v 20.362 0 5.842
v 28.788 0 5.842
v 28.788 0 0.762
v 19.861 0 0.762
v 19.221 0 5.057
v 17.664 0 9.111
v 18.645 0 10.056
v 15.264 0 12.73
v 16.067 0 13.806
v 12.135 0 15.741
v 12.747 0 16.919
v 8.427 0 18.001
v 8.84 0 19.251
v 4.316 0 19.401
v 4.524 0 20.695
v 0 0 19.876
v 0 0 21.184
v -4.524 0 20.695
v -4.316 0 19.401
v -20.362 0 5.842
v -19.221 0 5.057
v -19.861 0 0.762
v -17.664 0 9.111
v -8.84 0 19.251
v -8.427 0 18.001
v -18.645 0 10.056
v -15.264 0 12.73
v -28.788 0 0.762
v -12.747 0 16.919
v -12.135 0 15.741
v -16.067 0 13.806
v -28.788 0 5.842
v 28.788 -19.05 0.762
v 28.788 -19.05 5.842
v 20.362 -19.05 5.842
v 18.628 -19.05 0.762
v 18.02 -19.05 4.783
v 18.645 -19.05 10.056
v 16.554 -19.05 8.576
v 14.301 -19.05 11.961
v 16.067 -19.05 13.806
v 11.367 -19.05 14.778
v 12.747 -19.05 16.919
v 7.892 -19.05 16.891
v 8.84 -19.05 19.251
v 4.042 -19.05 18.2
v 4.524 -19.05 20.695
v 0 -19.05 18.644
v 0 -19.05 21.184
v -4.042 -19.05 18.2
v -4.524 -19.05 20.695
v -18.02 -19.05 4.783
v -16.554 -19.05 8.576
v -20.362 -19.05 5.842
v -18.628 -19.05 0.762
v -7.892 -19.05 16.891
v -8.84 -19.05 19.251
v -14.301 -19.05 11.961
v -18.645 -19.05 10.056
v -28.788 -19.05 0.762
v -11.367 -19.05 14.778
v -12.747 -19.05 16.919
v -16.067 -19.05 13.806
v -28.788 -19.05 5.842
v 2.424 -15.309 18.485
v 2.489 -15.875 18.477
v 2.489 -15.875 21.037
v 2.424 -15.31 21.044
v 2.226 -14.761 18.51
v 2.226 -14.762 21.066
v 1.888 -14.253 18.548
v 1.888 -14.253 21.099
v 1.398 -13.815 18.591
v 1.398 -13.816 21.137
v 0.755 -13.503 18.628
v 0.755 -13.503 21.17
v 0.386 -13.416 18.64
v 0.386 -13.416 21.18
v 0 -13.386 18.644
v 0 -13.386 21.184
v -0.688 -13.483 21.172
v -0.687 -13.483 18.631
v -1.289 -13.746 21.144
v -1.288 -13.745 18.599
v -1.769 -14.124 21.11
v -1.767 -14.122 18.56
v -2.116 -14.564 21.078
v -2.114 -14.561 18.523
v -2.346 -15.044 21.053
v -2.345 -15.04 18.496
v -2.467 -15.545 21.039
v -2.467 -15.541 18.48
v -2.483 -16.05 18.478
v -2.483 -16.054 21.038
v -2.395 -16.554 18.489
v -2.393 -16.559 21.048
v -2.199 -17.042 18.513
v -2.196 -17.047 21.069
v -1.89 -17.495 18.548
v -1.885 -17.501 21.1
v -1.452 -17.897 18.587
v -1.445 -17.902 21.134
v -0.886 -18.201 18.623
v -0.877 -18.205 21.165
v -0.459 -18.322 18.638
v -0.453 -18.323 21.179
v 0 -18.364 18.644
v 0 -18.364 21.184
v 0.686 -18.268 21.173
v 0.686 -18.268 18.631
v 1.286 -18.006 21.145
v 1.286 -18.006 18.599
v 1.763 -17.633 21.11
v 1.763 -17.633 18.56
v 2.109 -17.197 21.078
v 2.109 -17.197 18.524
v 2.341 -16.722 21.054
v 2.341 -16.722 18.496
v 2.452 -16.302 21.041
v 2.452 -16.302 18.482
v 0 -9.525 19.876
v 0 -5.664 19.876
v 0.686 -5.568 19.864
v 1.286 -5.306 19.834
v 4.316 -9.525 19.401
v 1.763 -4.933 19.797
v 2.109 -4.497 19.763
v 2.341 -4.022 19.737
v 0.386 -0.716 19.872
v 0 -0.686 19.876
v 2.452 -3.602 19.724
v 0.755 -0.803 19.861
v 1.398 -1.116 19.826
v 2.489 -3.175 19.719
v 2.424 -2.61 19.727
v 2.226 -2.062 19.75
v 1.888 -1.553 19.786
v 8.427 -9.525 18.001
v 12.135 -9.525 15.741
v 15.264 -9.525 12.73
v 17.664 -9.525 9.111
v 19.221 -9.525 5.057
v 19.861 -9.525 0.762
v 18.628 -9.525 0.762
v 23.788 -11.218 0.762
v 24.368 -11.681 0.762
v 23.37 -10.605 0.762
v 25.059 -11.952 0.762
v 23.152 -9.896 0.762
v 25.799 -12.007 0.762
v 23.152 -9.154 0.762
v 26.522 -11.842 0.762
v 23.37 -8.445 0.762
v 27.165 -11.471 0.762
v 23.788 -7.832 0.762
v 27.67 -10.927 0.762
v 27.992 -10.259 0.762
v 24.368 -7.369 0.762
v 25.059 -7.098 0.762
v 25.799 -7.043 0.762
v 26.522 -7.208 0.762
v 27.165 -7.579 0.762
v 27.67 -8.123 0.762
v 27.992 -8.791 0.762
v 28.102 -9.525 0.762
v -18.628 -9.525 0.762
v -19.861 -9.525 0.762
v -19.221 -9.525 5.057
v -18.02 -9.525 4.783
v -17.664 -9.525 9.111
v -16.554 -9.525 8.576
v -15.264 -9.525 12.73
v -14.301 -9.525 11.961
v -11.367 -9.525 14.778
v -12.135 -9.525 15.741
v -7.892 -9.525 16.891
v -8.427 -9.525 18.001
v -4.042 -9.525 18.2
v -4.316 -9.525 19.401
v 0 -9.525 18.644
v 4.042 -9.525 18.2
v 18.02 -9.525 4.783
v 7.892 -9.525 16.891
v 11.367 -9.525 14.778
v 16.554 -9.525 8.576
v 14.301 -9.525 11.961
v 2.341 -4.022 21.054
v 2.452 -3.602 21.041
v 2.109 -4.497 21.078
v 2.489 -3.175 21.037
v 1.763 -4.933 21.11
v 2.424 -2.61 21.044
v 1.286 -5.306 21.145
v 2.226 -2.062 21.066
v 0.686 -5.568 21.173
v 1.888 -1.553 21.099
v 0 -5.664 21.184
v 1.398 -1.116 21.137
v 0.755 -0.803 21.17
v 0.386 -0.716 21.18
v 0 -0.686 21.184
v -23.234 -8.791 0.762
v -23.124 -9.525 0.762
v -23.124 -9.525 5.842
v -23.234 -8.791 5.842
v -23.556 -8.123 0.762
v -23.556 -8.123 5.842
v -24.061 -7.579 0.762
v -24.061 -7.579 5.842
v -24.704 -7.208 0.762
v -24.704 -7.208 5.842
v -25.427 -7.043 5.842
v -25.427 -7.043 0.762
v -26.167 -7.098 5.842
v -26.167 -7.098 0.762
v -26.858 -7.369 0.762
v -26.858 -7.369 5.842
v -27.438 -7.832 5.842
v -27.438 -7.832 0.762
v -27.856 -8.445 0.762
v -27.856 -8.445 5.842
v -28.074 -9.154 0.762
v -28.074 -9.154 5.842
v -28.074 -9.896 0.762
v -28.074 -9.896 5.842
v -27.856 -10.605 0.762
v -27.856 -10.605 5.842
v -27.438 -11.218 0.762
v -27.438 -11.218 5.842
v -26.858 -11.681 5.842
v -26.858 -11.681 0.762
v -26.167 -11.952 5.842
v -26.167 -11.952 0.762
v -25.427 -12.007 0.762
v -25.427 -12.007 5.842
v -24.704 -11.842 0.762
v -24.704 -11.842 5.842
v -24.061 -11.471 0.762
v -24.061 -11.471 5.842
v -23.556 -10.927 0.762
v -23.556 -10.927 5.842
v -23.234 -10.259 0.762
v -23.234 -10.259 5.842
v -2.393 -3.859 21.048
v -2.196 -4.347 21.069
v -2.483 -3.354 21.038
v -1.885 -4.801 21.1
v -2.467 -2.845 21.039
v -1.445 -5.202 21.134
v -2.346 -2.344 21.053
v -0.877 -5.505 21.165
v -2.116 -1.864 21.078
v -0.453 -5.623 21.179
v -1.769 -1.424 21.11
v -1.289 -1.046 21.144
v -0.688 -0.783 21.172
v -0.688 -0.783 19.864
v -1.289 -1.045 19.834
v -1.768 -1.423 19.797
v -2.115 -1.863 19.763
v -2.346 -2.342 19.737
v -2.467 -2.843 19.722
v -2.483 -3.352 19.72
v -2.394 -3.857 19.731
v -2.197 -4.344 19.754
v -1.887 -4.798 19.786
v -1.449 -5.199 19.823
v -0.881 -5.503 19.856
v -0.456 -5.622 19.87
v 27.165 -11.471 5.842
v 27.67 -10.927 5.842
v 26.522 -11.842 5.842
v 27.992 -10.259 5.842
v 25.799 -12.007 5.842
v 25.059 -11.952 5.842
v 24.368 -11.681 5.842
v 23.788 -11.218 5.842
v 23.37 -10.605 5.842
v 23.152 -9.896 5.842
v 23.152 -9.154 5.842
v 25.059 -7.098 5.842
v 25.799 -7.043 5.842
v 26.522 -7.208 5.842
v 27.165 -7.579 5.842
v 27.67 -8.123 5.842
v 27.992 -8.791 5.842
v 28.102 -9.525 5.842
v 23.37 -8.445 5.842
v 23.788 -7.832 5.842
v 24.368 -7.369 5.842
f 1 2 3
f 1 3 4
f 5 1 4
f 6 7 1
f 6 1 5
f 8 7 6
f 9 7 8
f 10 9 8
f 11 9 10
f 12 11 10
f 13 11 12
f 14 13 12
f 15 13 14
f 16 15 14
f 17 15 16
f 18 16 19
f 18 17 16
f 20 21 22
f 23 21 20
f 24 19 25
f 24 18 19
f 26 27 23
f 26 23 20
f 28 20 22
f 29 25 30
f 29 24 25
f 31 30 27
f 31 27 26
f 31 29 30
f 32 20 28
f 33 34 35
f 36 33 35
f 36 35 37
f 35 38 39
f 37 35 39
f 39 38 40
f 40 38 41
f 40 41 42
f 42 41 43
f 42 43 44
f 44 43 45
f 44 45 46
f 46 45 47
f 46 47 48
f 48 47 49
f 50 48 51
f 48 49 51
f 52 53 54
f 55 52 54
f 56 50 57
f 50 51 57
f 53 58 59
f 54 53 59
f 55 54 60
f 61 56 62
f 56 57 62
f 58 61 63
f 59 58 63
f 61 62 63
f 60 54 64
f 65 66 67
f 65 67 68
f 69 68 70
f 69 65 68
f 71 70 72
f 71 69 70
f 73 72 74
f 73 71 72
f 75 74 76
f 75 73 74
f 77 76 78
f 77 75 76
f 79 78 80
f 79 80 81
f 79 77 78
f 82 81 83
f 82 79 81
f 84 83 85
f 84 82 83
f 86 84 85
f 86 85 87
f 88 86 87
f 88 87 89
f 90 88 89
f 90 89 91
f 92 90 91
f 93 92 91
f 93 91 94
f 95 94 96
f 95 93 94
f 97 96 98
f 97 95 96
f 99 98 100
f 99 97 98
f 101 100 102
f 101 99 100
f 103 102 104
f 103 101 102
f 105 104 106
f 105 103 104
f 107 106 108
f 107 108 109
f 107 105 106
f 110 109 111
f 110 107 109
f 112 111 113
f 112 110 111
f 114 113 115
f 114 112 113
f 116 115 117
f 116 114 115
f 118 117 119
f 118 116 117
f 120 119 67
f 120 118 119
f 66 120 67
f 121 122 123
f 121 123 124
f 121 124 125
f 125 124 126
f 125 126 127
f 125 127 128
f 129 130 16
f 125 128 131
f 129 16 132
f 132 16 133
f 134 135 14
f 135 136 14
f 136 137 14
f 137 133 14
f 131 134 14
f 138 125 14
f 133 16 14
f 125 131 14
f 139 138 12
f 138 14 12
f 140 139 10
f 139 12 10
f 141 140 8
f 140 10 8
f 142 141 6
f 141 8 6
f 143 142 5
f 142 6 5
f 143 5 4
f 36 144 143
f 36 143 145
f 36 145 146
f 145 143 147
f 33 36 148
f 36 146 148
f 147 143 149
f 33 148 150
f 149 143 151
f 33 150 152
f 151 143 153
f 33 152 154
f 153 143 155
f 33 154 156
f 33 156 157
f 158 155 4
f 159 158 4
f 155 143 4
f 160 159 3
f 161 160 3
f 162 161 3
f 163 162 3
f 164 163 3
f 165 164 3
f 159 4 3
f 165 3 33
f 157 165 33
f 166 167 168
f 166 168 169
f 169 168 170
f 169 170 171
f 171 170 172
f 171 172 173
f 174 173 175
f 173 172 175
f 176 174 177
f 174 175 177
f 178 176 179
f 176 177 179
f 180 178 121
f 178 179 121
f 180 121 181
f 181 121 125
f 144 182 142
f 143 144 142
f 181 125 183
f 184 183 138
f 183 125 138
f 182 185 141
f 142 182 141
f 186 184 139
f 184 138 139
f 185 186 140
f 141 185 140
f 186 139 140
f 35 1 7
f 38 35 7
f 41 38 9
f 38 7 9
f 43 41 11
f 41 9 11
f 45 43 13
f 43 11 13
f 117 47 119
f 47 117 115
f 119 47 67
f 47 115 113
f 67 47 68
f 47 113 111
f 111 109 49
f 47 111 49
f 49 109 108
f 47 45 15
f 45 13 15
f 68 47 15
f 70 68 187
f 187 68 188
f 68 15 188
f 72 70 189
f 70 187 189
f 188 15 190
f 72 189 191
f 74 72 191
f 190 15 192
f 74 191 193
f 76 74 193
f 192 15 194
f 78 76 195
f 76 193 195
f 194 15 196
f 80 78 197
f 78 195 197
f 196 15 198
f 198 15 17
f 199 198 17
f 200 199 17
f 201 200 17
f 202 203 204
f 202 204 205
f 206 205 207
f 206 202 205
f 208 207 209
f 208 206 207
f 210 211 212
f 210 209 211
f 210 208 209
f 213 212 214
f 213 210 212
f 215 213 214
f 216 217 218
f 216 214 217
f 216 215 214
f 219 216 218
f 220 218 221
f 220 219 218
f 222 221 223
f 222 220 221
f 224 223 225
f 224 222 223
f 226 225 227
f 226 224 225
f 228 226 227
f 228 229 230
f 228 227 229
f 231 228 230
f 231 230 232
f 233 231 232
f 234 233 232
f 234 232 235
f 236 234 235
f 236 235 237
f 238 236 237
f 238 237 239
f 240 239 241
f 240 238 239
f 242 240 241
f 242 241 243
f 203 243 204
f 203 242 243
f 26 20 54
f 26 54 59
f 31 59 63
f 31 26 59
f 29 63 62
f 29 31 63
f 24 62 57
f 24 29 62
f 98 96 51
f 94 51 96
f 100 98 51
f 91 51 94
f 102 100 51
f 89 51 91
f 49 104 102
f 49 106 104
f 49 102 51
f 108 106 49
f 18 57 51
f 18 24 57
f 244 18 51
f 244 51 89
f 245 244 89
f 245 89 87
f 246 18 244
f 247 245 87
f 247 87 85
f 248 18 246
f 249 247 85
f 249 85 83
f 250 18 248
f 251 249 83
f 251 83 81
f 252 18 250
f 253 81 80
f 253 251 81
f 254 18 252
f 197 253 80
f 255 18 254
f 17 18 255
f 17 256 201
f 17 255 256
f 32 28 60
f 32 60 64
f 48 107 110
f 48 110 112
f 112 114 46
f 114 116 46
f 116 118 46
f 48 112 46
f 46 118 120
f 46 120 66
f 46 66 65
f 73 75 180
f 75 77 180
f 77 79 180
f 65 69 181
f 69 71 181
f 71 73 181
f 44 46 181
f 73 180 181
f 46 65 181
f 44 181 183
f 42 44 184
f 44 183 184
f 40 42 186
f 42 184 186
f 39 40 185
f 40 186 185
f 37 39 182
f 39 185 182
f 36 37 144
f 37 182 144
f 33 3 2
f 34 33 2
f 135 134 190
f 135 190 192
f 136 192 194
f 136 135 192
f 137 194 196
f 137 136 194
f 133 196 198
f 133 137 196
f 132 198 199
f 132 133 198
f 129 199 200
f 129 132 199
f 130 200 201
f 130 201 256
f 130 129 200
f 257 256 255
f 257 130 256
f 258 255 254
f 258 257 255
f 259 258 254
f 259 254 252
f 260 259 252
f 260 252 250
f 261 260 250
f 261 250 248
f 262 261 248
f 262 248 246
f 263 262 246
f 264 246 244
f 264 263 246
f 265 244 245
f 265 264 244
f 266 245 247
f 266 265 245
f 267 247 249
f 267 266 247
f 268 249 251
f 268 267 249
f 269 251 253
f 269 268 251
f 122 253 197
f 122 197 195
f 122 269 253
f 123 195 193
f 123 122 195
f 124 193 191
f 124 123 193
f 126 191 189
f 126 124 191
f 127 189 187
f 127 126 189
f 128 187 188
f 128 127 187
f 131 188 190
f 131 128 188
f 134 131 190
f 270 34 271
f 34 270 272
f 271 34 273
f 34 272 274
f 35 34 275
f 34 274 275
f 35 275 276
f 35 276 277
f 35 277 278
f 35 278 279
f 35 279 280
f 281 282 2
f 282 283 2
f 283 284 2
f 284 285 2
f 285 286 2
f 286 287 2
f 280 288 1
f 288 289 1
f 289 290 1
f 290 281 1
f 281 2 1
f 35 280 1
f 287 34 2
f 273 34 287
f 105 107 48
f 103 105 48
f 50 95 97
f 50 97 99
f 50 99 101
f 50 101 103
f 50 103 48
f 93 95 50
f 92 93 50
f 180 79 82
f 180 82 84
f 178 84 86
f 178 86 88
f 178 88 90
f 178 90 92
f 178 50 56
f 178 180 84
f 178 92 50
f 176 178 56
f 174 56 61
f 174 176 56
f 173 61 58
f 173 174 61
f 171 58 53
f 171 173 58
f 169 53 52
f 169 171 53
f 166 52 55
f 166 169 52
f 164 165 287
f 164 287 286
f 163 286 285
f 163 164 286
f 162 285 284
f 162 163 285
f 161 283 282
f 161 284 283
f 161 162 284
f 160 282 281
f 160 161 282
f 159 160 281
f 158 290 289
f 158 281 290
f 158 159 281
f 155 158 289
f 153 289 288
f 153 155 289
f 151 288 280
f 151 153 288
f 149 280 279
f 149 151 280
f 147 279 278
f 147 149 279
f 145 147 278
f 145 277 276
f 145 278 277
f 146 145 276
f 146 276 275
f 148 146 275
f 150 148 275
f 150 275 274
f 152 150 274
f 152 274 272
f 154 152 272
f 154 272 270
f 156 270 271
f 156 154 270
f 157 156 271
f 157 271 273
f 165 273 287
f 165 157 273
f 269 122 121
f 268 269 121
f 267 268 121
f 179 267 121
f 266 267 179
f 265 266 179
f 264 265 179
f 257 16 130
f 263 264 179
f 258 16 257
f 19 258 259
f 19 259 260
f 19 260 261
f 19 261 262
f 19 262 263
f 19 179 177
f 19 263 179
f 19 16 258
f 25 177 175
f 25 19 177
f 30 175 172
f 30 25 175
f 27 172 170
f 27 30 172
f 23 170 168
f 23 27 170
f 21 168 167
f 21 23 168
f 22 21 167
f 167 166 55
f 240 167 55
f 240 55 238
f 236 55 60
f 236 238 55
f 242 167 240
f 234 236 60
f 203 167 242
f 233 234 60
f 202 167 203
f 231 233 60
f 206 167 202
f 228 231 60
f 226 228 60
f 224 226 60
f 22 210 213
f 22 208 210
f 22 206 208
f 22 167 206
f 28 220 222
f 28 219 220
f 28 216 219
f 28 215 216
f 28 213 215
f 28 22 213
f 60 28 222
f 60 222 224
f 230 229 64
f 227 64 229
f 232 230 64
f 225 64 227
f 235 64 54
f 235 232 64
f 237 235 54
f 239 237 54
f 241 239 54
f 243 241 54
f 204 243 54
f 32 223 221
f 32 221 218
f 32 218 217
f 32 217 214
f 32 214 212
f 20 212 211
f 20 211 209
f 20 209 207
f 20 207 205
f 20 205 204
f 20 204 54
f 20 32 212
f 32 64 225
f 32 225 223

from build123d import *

# Parameters (mm, degrees)
F1_DEPTH = 19.05
F3_DEPTH = 9.525
F5_R     = 2.4892
F6_DEPTH = 25.4


# Not quite as in the source:
# - a length typed as a fraction of an inch, garbled in the dataset ("3 / 203.2 mm" for 3/8 in), is restored


with BuildPart() as f1:
    # F0 (on Front) → F1 (new body)
    with BuildSketch(Plane.XZ):
        with BuildLine():
            ThreePointArc((0, 18.6436), (12.9107977631, 13.4497257251), (18.6280212841, 0.762))
            Line((18.6280212841, 0.762), (28.7880212841, 0.762))
            Line((28.7880212841, 0.762), (28.7880212841, 5.842))
            Line((28.7880212841, 5.842), (20.3621203454, 5.842))
            ThreePointArc((20.3621203454, 5.842), (12.7473588982, 16.9189169299), (0, 21.1836))
            Line((0, 21.1836), (0, 18.6436))
        make_face()
    extrude(amount=F1_DEPTH)

    # F2 (on face) → F3 (cut)
    with BuildSketch(Plane(origin=(0, 0, 0), x_dir=(-1, 0, 0), z_dir=(0, 1, 0))):
        with BuildLine():
            ThreePointArc((0, 19.8755), (-14.0541008295, 14.0541008295), (-19.8755, 0))
            Line((-19.8755, 0), (0, 0))
            Line((0, 0), (0, 19.8755))
        make_face()
    extrude(amount=-F3_DEPTH, mode=Mode.SUBTRACT)

    # F4: F1 across face


with BuildPart() as f1_1:
    add(f1.part)
    add(f1.part.mirror(Plane(origin=(0, -11.0496287129, 20.1229823432), x_dir=(0, -1, 0), z_dir=(-1, 0, 0))))

    # F5 (on Top) → F6 (cut)
    with BuildSketch(Plane.XY):
        with Locations((0, -15.875)):
            Circle(F5_R)
        with Locations((0, -3.175)):
            Circle(F5_R)
        with Locations((-25.6130212841, -9.525)):
            Circle(F5_R)
        with Locations((25.6130212841, -9.525)):
            Circle(F5_R)
    extrude(amount=F6_DEPTH, mode=Mode.SUBTRACT)


solid = f1_1.part
